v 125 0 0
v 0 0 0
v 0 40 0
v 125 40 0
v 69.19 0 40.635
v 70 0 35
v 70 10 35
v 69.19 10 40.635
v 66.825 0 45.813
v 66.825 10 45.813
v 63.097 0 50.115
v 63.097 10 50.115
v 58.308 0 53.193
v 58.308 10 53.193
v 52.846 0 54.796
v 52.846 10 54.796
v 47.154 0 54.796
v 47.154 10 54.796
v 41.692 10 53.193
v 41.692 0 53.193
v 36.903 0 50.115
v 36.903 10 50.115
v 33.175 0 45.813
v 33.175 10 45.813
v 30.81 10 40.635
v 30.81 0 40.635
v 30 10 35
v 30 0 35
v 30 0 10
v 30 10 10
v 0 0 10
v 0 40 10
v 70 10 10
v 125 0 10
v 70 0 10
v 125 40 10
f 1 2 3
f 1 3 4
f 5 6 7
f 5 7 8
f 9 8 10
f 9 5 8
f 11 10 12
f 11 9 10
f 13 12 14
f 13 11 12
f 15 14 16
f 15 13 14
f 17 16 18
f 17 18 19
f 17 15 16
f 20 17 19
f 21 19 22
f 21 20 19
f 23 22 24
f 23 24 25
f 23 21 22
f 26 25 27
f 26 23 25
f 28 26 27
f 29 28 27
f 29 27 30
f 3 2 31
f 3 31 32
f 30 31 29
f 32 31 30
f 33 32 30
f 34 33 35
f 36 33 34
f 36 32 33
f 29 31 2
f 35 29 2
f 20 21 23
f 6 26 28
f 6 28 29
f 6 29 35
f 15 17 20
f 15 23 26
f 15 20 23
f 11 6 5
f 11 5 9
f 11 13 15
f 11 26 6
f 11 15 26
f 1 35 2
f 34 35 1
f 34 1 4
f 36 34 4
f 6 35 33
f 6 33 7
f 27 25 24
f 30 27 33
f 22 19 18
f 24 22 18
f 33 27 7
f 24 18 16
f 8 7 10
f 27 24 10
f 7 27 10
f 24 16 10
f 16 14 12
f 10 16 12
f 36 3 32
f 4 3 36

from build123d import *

# Parameters (mm, degrees)
F0_W     = 125
F0_H     = 40
F1_DEPTH = 10
F3_DEPTH = 10


with BuildPart() as f1:
    # F0 (on Top) → F1 (new body)
    with BuildSketch(Plane.XY):
        with Locations((62.5, 20)):
            Rectangle(F0_W, F0_H)
    extrude(amount=F1_DEPTH)

    # F2 (on face) → F3 (join)
    with BuildSketch(Plane.XZ):
        with BuildLine():
            Line((30, 35), (30, 0))
            Line((30, 0), (70, 0))
            Line((70, 0), (70, 35))
            ThreePointArc((70, 35), (50, 55), (30, 35))
        make_face()
    extrude(amount=-F3_DEPTH)


solid = f1.part
